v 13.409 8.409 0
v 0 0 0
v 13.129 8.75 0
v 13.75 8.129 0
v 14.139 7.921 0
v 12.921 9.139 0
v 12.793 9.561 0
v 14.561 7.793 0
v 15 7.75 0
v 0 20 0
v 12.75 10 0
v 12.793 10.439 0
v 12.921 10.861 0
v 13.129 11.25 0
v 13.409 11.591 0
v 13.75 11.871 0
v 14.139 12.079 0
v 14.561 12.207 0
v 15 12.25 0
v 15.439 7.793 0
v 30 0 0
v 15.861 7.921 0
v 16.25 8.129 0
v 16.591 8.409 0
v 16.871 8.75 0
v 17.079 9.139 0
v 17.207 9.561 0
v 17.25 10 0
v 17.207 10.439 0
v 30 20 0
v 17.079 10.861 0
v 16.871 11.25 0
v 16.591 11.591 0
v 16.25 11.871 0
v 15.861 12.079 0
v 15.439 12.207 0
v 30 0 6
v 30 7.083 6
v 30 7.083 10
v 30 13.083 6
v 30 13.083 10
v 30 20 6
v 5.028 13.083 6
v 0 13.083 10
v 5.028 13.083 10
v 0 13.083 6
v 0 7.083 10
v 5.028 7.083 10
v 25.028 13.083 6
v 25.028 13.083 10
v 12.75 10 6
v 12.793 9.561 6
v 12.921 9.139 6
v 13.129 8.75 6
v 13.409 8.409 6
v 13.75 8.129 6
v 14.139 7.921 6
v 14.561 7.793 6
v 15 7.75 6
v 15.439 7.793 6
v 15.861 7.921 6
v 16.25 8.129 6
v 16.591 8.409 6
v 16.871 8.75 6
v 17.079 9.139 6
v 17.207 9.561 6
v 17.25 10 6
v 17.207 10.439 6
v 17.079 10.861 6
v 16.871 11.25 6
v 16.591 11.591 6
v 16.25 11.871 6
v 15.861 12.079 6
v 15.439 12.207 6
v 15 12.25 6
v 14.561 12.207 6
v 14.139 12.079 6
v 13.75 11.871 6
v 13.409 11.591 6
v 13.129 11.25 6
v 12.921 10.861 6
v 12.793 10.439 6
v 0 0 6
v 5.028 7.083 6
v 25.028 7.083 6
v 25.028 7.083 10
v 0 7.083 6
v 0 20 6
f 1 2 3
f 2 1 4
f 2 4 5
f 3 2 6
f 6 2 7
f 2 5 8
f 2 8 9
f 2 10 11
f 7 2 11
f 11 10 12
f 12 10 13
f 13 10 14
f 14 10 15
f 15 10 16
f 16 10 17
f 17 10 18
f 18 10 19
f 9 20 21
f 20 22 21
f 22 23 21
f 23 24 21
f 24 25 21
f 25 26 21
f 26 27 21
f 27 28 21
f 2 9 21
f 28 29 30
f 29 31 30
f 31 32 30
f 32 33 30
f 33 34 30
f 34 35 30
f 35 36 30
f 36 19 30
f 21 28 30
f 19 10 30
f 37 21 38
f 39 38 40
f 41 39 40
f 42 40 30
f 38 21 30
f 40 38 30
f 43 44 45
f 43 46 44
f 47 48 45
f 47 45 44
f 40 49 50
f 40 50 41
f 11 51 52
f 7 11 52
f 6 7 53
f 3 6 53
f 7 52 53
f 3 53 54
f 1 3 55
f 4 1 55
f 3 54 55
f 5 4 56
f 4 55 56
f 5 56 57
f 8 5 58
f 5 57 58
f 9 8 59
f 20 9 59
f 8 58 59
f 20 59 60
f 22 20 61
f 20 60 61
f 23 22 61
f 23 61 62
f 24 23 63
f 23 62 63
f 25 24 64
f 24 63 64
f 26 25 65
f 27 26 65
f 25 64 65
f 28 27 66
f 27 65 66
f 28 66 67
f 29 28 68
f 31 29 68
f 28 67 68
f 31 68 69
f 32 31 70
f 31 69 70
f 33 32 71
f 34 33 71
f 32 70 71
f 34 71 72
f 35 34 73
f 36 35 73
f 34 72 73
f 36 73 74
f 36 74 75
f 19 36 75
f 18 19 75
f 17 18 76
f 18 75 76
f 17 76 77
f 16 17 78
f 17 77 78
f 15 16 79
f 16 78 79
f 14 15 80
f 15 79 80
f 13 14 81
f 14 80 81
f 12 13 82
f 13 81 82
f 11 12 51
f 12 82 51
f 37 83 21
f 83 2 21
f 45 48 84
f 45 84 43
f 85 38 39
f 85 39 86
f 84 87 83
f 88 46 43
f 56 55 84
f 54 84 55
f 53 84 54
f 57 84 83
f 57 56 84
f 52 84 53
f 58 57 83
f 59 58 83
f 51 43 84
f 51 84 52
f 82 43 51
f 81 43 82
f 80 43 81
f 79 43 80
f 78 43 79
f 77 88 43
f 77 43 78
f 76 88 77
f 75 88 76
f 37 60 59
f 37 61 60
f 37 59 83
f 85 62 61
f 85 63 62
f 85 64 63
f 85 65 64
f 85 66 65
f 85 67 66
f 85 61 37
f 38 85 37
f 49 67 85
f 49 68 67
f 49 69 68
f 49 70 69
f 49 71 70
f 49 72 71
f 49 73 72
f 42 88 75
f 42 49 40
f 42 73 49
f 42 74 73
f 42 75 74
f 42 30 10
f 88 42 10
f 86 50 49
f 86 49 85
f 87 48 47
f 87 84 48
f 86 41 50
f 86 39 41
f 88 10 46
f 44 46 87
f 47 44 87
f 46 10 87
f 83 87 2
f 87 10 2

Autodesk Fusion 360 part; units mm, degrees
sketch "Skizze1" plane through (0, 0, 0) normal (0, 0, 1) x (1, 0, 0)
  line L0 (0, 0) -> (30, 0)
  line L1 (30, 0) -> (30, 20)
  line L2 (30, 20) -> (0, 20)
  line L3 (0, 20) -> (0, 0)
  dimension "d1" = 30
  dimension "d2" = 20
extrude "Extrusion1" add sketch "Skizze1" along normal blind 6
sketch "Skizze2" plane through (0, 0, 6) normal (0, 0, 1) x (-1, 0, 0)
  line L0 (0, -20) -> (0, 0)
  line L1 (0, 0) -> (-30, 0)
  line L2 (-30, 0) -> (-30, -20)
  line L3 (-30, -20) -> (0, -20)
  line L4 (0, -13.0831) -> (-30, -13.0831)
  line L5 (-30, -13.0831) -> (-30, -7.0831)
  line L6 (-30, -7.0831) -> (0, -7.0831)
  line L7 (0, -7.0831) -> (0, -13.0831)
  dimension "d5" = 30
  dimension "d6" = 6
extrude "Extrusion2" add sketch "Skizze2" along normal blind 4 contours L0 L2 L4 L5 L6 L7
sketch "Skizze3" plane through (0, 0, 10) normal (0, 0, 1) x (-1, 0, 0)
  line L0 (0, -7.0831) -> (-30, -7.0831)
  line L1 (-30, -7.0831) -> (-30, -13.0831)
  line L2 (-30, -13.0831) -> (0, -13.0831)
  line L3 (0, -13.0831) -> (0, -7.0831)
  line L4 (-5.028, -13.0831) -> (-25.028, -13.0831)
  line L5 (-25.028, -13.0831) -> (-25.028, -7.0831)
  line L6 (-25.028, -7.0831) -> (-5.028, -7.0831)
  line L7 (-5.028, -7.0831) -> (-5.028, -13.0831)
  dimension "d9" = 20
  dimension "d10" = 6
extrude "Extrusion3" cut sketch "Skizze3" against normal blind 4 contours L0 L2 L4 L5 L6 L7
sketch "Skizze4" plane through (0, 0, 6) normal (0, 0, 1) x (-1, 0, 0)
  line L0 (0, -13.0831) -> (-5.028, -13.0831)
  line L1 (-5.028, -13.0831) -> (-5.028, -7.0831)
  line L2 (-5.028, -7.0831) -> (0, -7.0831)
  line L3 (0, -7.0831) -> (0, 0)
  line L4 (0, 0) -> (-30, 0)
  line L5 (-30, 0) -> (-30, -7.0831)
  line L6 (-30, -7.0831) -> (-25.028, -7.0831)
  line L7 (-25.028, -7.0831) -> (-25.028, -13.0831)
  line L8 (-25.028, -13.0831) -> (-30, -13.0831)
  line L9 (-30, -13.0831) -> (-30, -20)
  line L10 (-30, -20) -> (0, -20)
  line L11 (0, -20) -> (0, -13.0831)
  circle A0 centre (-15, -10) radius 2.25
  dimension "d13" = 4.5
extrude "Extrusion4" cut sketch "Skizze4" against normal blind 6 contours A0
